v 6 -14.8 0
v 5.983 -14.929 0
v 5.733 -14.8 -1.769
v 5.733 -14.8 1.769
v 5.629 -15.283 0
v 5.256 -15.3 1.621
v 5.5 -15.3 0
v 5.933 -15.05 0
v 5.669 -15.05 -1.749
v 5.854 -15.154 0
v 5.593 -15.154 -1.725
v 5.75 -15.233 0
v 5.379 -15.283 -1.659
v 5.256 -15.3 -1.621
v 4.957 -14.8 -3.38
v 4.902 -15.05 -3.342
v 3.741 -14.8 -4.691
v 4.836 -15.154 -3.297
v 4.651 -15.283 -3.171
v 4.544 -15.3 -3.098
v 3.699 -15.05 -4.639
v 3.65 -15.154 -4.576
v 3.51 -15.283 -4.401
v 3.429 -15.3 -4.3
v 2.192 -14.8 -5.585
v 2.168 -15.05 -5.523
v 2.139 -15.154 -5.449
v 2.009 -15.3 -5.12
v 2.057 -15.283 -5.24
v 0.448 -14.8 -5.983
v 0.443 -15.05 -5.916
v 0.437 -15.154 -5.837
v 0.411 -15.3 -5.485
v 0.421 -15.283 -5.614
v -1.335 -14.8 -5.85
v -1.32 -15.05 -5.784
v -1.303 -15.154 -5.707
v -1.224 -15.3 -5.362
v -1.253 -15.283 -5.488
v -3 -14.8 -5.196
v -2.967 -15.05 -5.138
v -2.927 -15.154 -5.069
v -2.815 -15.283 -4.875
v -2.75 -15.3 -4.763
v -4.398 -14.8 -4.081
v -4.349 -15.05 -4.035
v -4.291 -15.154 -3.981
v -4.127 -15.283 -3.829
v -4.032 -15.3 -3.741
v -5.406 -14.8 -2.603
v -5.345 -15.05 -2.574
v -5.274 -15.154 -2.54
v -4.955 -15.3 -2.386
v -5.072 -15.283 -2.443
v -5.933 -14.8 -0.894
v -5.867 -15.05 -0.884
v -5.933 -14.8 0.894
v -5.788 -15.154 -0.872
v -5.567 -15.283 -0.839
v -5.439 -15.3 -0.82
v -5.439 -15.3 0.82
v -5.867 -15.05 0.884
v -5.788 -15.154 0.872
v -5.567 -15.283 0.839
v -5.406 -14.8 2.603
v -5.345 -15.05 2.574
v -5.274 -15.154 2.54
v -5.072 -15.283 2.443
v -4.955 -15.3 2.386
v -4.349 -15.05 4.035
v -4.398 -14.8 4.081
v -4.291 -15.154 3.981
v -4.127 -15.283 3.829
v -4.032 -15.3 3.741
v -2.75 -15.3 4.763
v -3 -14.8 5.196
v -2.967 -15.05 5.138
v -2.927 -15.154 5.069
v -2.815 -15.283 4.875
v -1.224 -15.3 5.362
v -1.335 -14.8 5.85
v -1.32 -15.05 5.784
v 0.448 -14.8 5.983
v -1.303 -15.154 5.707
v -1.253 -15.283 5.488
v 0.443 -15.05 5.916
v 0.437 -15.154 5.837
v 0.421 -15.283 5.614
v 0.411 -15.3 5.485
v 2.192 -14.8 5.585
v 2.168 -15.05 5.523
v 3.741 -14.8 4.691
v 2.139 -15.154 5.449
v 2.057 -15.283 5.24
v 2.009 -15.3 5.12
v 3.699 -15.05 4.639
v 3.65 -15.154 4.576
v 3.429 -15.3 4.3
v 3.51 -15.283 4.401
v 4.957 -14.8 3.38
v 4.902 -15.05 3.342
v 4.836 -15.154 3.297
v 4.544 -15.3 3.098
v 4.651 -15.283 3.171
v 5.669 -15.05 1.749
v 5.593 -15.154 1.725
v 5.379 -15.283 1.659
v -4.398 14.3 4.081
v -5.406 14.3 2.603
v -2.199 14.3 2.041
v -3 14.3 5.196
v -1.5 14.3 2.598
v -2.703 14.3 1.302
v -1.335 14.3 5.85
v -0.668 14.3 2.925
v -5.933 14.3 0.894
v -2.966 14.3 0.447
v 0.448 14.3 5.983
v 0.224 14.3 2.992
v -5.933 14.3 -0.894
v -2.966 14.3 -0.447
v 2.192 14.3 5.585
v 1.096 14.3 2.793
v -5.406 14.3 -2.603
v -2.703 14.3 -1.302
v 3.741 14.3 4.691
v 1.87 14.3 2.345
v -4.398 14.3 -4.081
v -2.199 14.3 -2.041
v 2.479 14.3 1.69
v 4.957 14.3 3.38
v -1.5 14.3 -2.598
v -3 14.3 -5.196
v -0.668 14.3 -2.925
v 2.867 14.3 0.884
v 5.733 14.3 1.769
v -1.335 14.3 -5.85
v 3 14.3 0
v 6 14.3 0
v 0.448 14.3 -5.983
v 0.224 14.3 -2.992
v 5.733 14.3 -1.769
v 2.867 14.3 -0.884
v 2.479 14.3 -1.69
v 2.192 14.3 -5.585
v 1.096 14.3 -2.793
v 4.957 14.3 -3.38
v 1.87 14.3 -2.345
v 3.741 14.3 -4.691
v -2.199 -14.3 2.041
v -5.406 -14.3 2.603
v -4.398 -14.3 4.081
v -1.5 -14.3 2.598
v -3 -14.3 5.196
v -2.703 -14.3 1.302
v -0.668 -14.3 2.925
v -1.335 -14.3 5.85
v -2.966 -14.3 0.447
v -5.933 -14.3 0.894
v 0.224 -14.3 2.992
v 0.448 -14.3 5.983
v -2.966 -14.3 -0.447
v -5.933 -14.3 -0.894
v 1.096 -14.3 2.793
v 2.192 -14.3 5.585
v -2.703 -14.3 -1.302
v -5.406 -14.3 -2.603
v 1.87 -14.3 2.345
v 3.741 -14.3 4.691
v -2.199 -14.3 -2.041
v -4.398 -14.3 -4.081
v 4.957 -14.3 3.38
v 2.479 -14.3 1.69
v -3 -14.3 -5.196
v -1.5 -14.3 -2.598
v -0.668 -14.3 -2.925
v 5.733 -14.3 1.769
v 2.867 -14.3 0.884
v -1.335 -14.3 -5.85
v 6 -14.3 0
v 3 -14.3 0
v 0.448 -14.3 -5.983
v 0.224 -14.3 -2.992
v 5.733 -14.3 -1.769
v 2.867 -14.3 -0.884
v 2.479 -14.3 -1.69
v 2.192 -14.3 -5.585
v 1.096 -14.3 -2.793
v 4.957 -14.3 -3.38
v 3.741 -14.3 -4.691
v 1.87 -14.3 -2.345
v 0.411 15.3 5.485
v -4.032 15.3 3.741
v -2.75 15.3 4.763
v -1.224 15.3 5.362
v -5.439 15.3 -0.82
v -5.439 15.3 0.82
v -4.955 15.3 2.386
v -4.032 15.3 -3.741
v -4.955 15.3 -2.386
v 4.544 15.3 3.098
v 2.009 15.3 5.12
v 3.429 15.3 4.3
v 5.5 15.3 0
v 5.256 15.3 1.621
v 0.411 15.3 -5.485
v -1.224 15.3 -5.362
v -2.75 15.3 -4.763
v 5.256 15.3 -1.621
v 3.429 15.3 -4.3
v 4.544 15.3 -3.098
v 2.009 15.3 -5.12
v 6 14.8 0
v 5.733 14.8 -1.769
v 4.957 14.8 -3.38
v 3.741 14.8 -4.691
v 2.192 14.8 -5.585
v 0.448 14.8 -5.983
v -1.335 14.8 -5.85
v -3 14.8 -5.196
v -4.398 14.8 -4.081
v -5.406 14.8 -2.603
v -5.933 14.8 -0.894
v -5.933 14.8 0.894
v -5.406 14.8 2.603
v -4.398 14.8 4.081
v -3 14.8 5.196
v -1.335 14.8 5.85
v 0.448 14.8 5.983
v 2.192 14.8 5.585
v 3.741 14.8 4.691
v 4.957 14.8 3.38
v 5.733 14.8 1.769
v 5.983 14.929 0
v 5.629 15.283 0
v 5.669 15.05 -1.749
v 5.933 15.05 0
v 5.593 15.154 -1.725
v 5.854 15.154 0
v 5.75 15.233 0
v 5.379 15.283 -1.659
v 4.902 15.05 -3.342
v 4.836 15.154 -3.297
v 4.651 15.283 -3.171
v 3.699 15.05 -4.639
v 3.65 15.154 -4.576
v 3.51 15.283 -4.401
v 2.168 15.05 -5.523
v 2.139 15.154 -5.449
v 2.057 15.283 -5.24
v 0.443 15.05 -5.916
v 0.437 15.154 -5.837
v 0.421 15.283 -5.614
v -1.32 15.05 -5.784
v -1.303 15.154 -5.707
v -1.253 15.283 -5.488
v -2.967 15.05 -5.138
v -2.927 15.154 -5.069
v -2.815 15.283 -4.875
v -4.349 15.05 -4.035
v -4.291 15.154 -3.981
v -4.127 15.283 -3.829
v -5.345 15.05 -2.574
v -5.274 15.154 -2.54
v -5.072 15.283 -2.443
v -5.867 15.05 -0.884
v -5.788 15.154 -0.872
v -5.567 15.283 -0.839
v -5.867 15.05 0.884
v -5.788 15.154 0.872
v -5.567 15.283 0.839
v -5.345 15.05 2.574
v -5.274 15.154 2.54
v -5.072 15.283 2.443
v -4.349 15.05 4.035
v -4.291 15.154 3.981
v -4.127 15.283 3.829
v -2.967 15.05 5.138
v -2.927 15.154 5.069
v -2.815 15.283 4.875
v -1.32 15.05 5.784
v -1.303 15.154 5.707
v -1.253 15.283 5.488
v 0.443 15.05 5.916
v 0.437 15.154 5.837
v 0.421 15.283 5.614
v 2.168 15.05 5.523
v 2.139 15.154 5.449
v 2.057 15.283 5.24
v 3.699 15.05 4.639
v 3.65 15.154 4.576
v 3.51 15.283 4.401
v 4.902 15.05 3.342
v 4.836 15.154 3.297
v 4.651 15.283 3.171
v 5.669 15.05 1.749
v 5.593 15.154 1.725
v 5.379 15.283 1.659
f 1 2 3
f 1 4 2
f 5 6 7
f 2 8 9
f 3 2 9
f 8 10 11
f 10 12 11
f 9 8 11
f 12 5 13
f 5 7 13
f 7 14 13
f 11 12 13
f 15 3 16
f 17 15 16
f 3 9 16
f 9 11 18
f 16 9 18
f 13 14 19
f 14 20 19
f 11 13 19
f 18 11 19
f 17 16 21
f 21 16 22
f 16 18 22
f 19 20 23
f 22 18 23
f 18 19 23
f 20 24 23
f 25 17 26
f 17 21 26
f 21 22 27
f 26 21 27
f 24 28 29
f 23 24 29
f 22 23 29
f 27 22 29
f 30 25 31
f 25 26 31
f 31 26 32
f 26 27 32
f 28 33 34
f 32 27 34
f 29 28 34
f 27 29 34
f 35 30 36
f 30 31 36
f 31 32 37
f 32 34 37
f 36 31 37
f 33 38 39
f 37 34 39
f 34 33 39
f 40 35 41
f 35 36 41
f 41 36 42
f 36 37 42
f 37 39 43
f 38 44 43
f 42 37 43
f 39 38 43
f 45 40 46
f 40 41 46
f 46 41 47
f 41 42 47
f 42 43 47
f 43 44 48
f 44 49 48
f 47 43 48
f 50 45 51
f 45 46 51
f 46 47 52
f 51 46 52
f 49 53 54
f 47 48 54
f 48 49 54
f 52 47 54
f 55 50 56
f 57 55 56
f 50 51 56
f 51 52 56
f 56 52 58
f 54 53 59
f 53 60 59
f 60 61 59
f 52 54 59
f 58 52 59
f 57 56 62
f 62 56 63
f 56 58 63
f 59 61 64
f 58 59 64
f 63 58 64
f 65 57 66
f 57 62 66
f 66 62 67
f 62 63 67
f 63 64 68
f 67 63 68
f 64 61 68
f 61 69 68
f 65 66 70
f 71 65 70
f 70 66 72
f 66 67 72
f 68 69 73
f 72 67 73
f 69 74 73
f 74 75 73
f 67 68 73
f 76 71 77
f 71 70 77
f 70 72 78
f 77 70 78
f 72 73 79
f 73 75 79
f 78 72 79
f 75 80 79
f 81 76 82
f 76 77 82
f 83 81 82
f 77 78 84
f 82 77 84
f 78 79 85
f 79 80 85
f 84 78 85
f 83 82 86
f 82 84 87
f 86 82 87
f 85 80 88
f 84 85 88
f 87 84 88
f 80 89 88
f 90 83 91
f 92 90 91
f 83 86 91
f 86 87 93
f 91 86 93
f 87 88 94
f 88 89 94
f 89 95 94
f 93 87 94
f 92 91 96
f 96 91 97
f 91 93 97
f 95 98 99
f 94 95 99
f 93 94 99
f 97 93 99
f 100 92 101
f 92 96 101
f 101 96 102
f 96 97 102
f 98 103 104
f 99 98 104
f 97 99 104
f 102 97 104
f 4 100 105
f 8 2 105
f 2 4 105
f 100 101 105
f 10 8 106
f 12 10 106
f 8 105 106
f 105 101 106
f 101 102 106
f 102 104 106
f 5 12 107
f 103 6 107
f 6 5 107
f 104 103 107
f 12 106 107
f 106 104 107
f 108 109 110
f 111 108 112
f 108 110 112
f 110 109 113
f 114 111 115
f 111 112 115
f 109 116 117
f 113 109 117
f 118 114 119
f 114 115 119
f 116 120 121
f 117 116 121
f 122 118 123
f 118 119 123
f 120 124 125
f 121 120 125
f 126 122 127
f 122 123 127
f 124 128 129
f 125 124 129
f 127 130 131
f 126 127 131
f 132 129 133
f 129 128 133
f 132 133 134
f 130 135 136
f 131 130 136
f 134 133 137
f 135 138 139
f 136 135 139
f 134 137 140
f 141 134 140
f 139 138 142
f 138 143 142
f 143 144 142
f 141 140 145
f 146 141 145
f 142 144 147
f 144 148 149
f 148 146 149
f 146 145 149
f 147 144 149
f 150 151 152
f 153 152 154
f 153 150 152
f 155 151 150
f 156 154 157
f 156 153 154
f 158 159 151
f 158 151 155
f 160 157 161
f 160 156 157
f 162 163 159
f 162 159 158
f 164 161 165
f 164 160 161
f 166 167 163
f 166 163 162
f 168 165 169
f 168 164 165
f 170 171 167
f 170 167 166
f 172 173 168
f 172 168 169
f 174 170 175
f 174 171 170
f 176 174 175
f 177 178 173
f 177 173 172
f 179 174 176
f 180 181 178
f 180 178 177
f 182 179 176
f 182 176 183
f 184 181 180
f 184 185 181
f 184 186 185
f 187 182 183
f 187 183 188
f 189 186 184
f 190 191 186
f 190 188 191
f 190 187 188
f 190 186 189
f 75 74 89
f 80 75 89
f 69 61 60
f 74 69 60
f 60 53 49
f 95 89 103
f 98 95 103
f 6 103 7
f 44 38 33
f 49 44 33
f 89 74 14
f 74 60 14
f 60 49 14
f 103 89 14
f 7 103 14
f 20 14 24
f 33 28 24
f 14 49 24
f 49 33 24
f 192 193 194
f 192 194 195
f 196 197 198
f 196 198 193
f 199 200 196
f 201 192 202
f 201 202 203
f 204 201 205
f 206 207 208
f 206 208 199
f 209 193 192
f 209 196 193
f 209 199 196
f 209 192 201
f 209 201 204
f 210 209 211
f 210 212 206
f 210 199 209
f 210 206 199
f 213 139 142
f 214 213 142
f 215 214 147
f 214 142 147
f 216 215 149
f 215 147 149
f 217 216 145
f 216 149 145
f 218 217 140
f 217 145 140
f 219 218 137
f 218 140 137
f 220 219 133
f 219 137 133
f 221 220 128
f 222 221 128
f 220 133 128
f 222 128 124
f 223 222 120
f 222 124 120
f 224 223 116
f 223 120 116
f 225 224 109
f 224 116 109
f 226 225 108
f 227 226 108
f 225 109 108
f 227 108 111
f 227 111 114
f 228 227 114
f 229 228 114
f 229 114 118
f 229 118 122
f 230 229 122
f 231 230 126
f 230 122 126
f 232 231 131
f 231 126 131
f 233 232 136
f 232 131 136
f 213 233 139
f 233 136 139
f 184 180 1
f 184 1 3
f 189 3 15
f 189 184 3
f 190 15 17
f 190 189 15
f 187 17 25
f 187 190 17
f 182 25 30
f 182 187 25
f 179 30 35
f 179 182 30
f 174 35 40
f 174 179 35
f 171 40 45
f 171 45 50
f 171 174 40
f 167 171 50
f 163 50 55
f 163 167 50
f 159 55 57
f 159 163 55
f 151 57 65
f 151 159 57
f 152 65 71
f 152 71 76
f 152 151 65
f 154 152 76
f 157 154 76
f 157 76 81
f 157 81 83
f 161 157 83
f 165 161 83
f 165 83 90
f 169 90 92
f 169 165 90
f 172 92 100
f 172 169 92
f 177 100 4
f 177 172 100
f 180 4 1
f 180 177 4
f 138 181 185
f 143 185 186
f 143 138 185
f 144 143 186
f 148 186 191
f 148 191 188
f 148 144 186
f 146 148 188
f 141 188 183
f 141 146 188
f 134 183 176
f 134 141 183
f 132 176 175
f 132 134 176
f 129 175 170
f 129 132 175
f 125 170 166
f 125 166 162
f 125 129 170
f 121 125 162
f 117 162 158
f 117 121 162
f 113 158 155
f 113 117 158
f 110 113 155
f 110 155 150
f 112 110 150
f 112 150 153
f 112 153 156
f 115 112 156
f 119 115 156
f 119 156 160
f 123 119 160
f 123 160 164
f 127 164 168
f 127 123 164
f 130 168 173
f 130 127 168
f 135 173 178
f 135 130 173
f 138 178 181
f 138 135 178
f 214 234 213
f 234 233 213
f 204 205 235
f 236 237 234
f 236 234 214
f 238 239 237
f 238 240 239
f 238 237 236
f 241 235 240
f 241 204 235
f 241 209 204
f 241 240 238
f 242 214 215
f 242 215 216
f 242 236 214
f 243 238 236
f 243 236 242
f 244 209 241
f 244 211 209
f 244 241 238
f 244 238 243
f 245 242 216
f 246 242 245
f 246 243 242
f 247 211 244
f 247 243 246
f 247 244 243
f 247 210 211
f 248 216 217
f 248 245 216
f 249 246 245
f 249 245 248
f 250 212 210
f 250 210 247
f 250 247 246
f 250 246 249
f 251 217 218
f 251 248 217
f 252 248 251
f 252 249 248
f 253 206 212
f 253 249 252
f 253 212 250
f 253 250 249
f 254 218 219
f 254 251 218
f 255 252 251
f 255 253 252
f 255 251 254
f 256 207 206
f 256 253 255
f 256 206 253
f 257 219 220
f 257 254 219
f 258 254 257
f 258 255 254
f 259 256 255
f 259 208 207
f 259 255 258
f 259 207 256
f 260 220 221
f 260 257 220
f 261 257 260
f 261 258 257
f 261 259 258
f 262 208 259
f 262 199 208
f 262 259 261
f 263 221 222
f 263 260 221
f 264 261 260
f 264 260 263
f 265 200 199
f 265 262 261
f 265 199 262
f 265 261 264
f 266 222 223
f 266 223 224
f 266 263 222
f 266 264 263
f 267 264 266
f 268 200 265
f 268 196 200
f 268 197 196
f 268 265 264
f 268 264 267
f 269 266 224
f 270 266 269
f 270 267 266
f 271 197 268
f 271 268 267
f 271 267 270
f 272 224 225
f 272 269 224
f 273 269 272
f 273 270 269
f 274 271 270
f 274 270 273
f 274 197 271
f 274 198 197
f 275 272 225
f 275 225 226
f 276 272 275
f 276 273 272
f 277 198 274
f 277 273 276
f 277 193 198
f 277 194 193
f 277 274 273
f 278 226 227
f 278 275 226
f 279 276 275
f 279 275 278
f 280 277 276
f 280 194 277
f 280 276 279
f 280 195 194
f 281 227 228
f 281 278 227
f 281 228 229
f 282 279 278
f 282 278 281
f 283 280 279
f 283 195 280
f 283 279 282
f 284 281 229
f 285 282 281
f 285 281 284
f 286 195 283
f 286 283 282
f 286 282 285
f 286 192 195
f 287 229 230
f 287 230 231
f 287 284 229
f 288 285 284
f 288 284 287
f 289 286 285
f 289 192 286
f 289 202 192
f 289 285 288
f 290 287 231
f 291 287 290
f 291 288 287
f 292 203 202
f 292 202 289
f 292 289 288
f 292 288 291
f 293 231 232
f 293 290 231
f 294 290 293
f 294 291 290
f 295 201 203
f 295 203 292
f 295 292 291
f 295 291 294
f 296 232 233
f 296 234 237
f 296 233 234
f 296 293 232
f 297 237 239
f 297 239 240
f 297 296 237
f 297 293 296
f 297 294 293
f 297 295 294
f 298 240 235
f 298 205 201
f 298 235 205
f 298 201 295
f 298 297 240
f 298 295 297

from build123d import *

# Parameters (mm, degrees)
SKETCH_1_R             = 3
EXTRUDE_1_DEPTH        = 14.3
SKETCH_2_R             = 6
EXTRUDE_2_DEPTH        = 1
FILLET_1_R             = 0.5
FILLET_1_OF_MIRROR_1_R = 0.5


with BuildPart() as part:
    # 草图1 → 凸台-拉伸1 (new body, symmetric)
    with BuildSketch(Plane(origin=(0, 0, 0), x_dir=(1, 0, 0), z_dir=(0, 1, 0))):
        Circle(SKETCH_1_R)
    extrude(amount=EXTRUDE_1_DEPTH, both=True)

    # 草图2 → 凸台-拉伸2 (add)
    with BuildSketch(Plane(origin=(0, 14.3, 0), x_dir=(1, 0, 0), z_dir=(0, 1, 0))):
        Circle(SKETCH_2_R)
    extrude_2 = extrude(amount=EXTRUDE_2_DEPTH)

    # 圆角1
    fillet_1_edges = [part.edges().sort_by_distance(p)[0] for p in [
        (-6, 15.3, 0),
    ]]
    fillet(fillet_1_edges, radius=FILLET_1_R)

    # 镜向1: 凸台-拉伸2 across plane
    add(extrude_2.mirror(Plane.ZX))

    # 圆角1 of 镜向1
    fillet_1_of_mirror_1_edges = [part.edges().sort_by_distance(p)[0] for p in [
        (-6, -15.3, 0),
    ]]
    fillet(fillet_1_of_mirror_1_edges, radius=FILLET_1_OF_MIRROR_1_R)


solid = part.part
